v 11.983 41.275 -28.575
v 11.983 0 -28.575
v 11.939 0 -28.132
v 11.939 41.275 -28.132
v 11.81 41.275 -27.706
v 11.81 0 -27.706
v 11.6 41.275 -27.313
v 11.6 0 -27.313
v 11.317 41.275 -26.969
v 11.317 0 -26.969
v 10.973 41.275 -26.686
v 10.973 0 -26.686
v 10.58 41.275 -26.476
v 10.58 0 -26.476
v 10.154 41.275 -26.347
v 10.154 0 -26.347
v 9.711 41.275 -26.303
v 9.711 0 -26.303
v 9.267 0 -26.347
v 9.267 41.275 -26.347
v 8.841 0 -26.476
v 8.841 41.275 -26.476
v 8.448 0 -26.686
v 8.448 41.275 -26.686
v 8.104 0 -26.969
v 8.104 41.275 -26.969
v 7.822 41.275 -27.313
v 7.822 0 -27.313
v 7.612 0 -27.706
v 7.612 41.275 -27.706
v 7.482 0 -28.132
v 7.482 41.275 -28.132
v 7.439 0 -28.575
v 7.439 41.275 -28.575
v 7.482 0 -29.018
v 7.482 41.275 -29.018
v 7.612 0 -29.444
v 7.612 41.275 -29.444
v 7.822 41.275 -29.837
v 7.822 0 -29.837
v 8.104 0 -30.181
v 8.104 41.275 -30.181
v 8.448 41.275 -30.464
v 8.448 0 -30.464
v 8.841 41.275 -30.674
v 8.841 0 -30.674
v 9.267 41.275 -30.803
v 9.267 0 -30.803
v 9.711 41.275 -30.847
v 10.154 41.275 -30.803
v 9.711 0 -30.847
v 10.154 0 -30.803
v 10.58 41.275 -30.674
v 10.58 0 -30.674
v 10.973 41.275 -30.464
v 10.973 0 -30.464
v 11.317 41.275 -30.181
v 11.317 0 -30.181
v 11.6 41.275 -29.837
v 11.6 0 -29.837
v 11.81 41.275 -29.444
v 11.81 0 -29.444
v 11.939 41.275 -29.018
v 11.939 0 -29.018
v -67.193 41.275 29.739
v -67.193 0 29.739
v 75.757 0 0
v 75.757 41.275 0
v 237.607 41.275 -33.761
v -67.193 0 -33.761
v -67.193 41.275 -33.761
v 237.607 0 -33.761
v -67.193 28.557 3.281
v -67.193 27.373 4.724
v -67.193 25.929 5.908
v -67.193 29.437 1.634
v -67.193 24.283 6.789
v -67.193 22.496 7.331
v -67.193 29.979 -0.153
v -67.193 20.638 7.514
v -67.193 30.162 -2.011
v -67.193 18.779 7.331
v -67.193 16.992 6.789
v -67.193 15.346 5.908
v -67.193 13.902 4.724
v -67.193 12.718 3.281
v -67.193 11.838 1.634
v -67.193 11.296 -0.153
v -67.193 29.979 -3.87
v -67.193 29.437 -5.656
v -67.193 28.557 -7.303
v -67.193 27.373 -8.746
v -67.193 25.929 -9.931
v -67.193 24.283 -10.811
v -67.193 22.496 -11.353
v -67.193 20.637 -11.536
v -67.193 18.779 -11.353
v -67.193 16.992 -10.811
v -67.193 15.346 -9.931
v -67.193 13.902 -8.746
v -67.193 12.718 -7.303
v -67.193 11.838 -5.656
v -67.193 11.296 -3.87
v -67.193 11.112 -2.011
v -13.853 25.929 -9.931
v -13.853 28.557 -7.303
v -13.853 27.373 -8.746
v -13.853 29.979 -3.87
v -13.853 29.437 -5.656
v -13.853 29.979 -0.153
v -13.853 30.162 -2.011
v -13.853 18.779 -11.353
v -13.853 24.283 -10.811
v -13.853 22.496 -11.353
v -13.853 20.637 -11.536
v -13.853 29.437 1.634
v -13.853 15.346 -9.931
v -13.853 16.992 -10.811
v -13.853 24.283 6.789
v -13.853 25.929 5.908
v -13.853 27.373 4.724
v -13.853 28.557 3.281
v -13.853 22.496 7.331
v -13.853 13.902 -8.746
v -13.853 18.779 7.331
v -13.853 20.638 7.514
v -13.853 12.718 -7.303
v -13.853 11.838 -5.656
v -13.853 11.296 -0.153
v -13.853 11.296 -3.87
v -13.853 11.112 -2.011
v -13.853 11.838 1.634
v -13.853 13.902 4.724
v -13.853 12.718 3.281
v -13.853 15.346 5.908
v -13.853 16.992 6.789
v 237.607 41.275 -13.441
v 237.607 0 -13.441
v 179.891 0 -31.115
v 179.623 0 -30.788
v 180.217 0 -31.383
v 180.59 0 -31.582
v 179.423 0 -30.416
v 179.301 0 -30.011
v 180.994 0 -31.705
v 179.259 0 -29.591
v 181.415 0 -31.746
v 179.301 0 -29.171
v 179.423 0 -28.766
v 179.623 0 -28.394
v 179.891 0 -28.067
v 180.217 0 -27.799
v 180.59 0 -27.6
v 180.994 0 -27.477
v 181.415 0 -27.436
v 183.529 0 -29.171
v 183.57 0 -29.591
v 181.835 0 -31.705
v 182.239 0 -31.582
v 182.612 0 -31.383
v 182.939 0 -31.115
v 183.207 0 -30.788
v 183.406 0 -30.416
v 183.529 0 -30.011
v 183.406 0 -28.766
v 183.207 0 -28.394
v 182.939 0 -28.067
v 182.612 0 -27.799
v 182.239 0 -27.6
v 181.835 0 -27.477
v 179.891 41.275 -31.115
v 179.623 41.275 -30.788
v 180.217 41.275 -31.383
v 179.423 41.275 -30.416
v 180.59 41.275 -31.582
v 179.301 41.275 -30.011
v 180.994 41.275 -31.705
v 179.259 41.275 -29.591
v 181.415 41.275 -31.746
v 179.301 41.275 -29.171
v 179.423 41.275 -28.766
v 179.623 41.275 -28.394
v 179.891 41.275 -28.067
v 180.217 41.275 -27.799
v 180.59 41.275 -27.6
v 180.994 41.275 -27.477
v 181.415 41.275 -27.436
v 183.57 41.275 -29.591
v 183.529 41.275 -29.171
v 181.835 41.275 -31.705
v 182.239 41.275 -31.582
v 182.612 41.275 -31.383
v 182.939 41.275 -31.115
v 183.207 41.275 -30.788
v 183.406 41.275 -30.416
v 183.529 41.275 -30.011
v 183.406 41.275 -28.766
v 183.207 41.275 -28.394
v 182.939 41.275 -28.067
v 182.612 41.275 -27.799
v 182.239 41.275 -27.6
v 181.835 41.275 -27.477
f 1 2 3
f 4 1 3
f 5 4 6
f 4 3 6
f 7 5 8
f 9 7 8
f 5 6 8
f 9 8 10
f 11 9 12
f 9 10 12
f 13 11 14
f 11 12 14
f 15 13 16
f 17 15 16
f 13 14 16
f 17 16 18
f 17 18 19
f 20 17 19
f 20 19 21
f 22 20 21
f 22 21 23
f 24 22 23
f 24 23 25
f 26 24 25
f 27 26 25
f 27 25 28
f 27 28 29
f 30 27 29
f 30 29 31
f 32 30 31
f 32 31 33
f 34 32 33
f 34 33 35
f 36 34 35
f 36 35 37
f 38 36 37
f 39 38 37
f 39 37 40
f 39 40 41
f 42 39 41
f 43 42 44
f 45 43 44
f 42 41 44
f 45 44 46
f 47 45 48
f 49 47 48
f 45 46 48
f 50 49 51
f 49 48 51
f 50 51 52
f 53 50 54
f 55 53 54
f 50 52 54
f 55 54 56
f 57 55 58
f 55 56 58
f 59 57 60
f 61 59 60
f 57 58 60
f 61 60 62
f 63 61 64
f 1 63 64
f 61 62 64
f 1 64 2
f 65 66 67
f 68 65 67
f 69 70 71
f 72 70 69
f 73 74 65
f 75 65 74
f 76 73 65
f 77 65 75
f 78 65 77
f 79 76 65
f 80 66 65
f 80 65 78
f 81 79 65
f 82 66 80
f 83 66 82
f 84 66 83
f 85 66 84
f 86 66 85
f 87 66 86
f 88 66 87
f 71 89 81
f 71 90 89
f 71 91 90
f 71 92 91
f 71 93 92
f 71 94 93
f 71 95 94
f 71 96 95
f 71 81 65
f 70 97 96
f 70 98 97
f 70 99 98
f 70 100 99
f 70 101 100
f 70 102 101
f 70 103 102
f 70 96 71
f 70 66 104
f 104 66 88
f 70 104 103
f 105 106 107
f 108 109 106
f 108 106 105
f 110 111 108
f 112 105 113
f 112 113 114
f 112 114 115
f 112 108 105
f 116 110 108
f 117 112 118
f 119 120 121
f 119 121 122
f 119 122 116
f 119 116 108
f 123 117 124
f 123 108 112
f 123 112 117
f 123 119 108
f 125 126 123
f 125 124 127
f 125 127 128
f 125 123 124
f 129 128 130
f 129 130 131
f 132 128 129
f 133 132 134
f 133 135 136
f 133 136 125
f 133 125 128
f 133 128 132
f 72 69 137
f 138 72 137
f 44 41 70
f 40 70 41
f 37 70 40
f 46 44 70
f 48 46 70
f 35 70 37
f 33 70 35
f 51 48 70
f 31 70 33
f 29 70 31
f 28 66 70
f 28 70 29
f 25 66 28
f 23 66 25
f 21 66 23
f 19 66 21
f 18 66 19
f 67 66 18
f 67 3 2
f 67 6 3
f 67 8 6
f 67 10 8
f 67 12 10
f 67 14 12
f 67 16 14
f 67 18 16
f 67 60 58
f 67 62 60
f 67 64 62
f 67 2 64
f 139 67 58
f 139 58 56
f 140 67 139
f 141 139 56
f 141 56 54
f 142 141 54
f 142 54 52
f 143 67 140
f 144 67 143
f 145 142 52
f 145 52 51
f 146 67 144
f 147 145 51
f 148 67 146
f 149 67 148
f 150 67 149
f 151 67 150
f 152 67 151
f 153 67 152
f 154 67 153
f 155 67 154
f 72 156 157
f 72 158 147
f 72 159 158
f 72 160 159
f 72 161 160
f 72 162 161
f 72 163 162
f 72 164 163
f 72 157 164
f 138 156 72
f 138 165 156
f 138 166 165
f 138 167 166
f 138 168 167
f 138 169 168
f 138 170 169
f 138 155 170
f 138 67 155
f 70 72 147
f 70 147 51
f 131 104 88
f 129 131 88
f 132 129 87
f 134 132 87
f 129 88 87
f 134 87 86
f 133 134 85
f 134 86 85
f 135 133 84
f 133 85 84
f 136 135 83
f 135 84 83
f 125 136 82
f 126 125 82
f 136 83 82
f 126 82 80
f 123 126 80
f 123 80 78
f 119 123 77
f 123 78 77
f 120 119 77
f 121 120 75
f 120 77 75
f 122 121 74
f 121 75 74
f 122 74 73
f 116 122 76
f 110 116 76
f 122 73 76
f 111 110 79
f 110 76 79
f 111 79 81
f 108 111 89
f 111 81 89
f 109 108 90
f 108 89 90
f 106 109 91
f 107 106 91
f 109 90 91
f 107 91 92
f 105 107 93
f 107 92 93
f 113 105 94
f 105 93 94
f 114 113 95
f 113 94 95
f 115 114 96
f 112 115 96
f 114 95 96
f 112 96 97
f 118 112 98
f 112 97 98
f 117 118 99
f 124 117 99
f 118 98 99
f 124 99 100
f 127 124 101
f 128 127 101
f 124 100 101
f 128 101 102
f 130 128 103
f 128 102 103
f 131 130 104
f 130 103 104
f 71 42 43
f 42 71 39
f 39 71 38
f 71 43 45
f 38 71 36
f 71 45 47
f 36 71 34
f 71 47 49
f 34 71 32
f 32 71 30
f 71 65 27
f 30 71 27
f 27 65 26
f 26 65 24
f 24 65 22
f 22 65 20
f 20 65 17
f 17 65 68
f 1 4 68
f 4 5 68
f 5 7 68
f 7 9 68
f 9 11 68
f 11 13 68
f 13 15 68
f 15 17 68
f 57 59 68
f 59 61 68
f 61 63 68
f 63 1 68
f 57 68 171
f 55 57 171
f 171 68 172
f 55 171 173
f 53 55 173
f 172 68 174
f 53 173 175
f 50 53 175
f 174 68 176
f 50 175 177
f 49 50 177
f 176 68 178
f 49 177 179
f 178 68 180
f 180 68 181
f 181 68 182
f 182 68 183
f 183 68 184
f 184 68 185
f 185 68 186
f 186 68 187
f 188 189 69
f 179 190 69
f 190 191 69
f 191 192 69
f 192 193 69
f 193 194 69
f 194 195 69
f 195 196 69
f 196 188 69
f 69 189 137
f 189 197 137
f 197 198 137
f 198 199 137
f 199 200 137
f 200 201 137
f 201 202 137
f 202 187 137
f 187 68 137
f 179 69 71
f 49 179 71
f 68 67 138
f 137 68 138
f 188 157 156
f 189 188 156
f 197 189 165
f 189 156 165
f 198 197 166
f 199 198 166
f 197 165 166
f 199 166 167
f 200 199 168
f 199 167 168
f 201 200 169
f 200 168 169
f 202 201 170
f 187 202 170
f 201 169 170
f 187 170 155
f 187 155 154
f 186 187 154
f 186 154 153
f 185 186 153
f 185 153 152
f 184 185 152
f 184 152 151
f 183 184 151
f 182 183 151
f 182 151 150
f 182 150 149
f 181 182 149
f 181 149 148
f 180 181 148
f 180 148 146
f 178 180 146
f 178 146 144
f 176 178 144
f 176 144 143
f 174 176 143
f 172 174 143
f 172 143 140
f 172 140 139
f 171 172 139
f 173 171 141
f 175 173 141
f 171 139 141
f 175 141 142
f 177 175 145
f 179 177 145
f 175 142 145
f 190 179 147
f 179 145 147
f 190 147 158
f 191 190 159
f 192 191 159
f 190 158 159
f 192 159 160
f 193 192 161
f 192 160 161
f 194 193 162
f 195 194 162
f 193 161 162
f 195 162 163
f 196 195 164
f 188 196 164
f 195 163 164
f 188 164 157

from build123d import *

# Parameters (mm, degrees)
F1_DEPTH = 41.275
F2_R     = 9.525
F3_DEPTH = 53.34
F5_DEPTH = 55.372
F6_R     = 2.271843
F7_DEPTH = 106.934
F8_R     = 2.155263
F9_DEPTH = 91.948


with BuildPart() as f1:
    # F0 (on Front) → F1 (new body)
    with BuildSketch(Plane.XZ):
        Polygon((237.607324, -13.441301), (-67.192676, 29.738699), (-67.192676, -33.761301), (237.607324, -33.761301), align=None)
    extrude(amount=-F1_DEPTH)

    # F2 (on face) → F3 (cut)
    with BuildSketch(Plane(origin=(-67.192676, 0, 0), x_dir=(0, -1, 0), z_dir=(-1, 0, 0))):
        with Locations((-20.6375, -2.011301)):
            Circle(F2_R)
    extrude(amount=-F3_DEPTH, mode=Mode.SUBTRACT)

    # F4 (on face) → F5 (cut)
    with BuildSketch(Plane.XZ):
        Polygon((237.607324, -13.441301), (-67.192676, 29.738699), (75.7569, 0), align=None)
    extrude(amount=-F5_DEPTH, mode=Mode.SUBTRACT)

    # F6 (on Front) → F7 (cut)
    with BuildSketch(Plane.XZ):
        with Locations((9.710665, -28.575001)):
            Circle(F6_R)
    extrude(amount=-F7_DEPTH, mode=Mode.SUBTRACT)

    # F8 (on face) → F9 (cut)
    with BuildSketch(Plane.XZ):
        with Locations((181.414664, -29.591002)):
            Circle(F8_R)
    extrude(amount=-F9_DEPTH, mode=Mode.SUBTRACT)


solid = f1.part
